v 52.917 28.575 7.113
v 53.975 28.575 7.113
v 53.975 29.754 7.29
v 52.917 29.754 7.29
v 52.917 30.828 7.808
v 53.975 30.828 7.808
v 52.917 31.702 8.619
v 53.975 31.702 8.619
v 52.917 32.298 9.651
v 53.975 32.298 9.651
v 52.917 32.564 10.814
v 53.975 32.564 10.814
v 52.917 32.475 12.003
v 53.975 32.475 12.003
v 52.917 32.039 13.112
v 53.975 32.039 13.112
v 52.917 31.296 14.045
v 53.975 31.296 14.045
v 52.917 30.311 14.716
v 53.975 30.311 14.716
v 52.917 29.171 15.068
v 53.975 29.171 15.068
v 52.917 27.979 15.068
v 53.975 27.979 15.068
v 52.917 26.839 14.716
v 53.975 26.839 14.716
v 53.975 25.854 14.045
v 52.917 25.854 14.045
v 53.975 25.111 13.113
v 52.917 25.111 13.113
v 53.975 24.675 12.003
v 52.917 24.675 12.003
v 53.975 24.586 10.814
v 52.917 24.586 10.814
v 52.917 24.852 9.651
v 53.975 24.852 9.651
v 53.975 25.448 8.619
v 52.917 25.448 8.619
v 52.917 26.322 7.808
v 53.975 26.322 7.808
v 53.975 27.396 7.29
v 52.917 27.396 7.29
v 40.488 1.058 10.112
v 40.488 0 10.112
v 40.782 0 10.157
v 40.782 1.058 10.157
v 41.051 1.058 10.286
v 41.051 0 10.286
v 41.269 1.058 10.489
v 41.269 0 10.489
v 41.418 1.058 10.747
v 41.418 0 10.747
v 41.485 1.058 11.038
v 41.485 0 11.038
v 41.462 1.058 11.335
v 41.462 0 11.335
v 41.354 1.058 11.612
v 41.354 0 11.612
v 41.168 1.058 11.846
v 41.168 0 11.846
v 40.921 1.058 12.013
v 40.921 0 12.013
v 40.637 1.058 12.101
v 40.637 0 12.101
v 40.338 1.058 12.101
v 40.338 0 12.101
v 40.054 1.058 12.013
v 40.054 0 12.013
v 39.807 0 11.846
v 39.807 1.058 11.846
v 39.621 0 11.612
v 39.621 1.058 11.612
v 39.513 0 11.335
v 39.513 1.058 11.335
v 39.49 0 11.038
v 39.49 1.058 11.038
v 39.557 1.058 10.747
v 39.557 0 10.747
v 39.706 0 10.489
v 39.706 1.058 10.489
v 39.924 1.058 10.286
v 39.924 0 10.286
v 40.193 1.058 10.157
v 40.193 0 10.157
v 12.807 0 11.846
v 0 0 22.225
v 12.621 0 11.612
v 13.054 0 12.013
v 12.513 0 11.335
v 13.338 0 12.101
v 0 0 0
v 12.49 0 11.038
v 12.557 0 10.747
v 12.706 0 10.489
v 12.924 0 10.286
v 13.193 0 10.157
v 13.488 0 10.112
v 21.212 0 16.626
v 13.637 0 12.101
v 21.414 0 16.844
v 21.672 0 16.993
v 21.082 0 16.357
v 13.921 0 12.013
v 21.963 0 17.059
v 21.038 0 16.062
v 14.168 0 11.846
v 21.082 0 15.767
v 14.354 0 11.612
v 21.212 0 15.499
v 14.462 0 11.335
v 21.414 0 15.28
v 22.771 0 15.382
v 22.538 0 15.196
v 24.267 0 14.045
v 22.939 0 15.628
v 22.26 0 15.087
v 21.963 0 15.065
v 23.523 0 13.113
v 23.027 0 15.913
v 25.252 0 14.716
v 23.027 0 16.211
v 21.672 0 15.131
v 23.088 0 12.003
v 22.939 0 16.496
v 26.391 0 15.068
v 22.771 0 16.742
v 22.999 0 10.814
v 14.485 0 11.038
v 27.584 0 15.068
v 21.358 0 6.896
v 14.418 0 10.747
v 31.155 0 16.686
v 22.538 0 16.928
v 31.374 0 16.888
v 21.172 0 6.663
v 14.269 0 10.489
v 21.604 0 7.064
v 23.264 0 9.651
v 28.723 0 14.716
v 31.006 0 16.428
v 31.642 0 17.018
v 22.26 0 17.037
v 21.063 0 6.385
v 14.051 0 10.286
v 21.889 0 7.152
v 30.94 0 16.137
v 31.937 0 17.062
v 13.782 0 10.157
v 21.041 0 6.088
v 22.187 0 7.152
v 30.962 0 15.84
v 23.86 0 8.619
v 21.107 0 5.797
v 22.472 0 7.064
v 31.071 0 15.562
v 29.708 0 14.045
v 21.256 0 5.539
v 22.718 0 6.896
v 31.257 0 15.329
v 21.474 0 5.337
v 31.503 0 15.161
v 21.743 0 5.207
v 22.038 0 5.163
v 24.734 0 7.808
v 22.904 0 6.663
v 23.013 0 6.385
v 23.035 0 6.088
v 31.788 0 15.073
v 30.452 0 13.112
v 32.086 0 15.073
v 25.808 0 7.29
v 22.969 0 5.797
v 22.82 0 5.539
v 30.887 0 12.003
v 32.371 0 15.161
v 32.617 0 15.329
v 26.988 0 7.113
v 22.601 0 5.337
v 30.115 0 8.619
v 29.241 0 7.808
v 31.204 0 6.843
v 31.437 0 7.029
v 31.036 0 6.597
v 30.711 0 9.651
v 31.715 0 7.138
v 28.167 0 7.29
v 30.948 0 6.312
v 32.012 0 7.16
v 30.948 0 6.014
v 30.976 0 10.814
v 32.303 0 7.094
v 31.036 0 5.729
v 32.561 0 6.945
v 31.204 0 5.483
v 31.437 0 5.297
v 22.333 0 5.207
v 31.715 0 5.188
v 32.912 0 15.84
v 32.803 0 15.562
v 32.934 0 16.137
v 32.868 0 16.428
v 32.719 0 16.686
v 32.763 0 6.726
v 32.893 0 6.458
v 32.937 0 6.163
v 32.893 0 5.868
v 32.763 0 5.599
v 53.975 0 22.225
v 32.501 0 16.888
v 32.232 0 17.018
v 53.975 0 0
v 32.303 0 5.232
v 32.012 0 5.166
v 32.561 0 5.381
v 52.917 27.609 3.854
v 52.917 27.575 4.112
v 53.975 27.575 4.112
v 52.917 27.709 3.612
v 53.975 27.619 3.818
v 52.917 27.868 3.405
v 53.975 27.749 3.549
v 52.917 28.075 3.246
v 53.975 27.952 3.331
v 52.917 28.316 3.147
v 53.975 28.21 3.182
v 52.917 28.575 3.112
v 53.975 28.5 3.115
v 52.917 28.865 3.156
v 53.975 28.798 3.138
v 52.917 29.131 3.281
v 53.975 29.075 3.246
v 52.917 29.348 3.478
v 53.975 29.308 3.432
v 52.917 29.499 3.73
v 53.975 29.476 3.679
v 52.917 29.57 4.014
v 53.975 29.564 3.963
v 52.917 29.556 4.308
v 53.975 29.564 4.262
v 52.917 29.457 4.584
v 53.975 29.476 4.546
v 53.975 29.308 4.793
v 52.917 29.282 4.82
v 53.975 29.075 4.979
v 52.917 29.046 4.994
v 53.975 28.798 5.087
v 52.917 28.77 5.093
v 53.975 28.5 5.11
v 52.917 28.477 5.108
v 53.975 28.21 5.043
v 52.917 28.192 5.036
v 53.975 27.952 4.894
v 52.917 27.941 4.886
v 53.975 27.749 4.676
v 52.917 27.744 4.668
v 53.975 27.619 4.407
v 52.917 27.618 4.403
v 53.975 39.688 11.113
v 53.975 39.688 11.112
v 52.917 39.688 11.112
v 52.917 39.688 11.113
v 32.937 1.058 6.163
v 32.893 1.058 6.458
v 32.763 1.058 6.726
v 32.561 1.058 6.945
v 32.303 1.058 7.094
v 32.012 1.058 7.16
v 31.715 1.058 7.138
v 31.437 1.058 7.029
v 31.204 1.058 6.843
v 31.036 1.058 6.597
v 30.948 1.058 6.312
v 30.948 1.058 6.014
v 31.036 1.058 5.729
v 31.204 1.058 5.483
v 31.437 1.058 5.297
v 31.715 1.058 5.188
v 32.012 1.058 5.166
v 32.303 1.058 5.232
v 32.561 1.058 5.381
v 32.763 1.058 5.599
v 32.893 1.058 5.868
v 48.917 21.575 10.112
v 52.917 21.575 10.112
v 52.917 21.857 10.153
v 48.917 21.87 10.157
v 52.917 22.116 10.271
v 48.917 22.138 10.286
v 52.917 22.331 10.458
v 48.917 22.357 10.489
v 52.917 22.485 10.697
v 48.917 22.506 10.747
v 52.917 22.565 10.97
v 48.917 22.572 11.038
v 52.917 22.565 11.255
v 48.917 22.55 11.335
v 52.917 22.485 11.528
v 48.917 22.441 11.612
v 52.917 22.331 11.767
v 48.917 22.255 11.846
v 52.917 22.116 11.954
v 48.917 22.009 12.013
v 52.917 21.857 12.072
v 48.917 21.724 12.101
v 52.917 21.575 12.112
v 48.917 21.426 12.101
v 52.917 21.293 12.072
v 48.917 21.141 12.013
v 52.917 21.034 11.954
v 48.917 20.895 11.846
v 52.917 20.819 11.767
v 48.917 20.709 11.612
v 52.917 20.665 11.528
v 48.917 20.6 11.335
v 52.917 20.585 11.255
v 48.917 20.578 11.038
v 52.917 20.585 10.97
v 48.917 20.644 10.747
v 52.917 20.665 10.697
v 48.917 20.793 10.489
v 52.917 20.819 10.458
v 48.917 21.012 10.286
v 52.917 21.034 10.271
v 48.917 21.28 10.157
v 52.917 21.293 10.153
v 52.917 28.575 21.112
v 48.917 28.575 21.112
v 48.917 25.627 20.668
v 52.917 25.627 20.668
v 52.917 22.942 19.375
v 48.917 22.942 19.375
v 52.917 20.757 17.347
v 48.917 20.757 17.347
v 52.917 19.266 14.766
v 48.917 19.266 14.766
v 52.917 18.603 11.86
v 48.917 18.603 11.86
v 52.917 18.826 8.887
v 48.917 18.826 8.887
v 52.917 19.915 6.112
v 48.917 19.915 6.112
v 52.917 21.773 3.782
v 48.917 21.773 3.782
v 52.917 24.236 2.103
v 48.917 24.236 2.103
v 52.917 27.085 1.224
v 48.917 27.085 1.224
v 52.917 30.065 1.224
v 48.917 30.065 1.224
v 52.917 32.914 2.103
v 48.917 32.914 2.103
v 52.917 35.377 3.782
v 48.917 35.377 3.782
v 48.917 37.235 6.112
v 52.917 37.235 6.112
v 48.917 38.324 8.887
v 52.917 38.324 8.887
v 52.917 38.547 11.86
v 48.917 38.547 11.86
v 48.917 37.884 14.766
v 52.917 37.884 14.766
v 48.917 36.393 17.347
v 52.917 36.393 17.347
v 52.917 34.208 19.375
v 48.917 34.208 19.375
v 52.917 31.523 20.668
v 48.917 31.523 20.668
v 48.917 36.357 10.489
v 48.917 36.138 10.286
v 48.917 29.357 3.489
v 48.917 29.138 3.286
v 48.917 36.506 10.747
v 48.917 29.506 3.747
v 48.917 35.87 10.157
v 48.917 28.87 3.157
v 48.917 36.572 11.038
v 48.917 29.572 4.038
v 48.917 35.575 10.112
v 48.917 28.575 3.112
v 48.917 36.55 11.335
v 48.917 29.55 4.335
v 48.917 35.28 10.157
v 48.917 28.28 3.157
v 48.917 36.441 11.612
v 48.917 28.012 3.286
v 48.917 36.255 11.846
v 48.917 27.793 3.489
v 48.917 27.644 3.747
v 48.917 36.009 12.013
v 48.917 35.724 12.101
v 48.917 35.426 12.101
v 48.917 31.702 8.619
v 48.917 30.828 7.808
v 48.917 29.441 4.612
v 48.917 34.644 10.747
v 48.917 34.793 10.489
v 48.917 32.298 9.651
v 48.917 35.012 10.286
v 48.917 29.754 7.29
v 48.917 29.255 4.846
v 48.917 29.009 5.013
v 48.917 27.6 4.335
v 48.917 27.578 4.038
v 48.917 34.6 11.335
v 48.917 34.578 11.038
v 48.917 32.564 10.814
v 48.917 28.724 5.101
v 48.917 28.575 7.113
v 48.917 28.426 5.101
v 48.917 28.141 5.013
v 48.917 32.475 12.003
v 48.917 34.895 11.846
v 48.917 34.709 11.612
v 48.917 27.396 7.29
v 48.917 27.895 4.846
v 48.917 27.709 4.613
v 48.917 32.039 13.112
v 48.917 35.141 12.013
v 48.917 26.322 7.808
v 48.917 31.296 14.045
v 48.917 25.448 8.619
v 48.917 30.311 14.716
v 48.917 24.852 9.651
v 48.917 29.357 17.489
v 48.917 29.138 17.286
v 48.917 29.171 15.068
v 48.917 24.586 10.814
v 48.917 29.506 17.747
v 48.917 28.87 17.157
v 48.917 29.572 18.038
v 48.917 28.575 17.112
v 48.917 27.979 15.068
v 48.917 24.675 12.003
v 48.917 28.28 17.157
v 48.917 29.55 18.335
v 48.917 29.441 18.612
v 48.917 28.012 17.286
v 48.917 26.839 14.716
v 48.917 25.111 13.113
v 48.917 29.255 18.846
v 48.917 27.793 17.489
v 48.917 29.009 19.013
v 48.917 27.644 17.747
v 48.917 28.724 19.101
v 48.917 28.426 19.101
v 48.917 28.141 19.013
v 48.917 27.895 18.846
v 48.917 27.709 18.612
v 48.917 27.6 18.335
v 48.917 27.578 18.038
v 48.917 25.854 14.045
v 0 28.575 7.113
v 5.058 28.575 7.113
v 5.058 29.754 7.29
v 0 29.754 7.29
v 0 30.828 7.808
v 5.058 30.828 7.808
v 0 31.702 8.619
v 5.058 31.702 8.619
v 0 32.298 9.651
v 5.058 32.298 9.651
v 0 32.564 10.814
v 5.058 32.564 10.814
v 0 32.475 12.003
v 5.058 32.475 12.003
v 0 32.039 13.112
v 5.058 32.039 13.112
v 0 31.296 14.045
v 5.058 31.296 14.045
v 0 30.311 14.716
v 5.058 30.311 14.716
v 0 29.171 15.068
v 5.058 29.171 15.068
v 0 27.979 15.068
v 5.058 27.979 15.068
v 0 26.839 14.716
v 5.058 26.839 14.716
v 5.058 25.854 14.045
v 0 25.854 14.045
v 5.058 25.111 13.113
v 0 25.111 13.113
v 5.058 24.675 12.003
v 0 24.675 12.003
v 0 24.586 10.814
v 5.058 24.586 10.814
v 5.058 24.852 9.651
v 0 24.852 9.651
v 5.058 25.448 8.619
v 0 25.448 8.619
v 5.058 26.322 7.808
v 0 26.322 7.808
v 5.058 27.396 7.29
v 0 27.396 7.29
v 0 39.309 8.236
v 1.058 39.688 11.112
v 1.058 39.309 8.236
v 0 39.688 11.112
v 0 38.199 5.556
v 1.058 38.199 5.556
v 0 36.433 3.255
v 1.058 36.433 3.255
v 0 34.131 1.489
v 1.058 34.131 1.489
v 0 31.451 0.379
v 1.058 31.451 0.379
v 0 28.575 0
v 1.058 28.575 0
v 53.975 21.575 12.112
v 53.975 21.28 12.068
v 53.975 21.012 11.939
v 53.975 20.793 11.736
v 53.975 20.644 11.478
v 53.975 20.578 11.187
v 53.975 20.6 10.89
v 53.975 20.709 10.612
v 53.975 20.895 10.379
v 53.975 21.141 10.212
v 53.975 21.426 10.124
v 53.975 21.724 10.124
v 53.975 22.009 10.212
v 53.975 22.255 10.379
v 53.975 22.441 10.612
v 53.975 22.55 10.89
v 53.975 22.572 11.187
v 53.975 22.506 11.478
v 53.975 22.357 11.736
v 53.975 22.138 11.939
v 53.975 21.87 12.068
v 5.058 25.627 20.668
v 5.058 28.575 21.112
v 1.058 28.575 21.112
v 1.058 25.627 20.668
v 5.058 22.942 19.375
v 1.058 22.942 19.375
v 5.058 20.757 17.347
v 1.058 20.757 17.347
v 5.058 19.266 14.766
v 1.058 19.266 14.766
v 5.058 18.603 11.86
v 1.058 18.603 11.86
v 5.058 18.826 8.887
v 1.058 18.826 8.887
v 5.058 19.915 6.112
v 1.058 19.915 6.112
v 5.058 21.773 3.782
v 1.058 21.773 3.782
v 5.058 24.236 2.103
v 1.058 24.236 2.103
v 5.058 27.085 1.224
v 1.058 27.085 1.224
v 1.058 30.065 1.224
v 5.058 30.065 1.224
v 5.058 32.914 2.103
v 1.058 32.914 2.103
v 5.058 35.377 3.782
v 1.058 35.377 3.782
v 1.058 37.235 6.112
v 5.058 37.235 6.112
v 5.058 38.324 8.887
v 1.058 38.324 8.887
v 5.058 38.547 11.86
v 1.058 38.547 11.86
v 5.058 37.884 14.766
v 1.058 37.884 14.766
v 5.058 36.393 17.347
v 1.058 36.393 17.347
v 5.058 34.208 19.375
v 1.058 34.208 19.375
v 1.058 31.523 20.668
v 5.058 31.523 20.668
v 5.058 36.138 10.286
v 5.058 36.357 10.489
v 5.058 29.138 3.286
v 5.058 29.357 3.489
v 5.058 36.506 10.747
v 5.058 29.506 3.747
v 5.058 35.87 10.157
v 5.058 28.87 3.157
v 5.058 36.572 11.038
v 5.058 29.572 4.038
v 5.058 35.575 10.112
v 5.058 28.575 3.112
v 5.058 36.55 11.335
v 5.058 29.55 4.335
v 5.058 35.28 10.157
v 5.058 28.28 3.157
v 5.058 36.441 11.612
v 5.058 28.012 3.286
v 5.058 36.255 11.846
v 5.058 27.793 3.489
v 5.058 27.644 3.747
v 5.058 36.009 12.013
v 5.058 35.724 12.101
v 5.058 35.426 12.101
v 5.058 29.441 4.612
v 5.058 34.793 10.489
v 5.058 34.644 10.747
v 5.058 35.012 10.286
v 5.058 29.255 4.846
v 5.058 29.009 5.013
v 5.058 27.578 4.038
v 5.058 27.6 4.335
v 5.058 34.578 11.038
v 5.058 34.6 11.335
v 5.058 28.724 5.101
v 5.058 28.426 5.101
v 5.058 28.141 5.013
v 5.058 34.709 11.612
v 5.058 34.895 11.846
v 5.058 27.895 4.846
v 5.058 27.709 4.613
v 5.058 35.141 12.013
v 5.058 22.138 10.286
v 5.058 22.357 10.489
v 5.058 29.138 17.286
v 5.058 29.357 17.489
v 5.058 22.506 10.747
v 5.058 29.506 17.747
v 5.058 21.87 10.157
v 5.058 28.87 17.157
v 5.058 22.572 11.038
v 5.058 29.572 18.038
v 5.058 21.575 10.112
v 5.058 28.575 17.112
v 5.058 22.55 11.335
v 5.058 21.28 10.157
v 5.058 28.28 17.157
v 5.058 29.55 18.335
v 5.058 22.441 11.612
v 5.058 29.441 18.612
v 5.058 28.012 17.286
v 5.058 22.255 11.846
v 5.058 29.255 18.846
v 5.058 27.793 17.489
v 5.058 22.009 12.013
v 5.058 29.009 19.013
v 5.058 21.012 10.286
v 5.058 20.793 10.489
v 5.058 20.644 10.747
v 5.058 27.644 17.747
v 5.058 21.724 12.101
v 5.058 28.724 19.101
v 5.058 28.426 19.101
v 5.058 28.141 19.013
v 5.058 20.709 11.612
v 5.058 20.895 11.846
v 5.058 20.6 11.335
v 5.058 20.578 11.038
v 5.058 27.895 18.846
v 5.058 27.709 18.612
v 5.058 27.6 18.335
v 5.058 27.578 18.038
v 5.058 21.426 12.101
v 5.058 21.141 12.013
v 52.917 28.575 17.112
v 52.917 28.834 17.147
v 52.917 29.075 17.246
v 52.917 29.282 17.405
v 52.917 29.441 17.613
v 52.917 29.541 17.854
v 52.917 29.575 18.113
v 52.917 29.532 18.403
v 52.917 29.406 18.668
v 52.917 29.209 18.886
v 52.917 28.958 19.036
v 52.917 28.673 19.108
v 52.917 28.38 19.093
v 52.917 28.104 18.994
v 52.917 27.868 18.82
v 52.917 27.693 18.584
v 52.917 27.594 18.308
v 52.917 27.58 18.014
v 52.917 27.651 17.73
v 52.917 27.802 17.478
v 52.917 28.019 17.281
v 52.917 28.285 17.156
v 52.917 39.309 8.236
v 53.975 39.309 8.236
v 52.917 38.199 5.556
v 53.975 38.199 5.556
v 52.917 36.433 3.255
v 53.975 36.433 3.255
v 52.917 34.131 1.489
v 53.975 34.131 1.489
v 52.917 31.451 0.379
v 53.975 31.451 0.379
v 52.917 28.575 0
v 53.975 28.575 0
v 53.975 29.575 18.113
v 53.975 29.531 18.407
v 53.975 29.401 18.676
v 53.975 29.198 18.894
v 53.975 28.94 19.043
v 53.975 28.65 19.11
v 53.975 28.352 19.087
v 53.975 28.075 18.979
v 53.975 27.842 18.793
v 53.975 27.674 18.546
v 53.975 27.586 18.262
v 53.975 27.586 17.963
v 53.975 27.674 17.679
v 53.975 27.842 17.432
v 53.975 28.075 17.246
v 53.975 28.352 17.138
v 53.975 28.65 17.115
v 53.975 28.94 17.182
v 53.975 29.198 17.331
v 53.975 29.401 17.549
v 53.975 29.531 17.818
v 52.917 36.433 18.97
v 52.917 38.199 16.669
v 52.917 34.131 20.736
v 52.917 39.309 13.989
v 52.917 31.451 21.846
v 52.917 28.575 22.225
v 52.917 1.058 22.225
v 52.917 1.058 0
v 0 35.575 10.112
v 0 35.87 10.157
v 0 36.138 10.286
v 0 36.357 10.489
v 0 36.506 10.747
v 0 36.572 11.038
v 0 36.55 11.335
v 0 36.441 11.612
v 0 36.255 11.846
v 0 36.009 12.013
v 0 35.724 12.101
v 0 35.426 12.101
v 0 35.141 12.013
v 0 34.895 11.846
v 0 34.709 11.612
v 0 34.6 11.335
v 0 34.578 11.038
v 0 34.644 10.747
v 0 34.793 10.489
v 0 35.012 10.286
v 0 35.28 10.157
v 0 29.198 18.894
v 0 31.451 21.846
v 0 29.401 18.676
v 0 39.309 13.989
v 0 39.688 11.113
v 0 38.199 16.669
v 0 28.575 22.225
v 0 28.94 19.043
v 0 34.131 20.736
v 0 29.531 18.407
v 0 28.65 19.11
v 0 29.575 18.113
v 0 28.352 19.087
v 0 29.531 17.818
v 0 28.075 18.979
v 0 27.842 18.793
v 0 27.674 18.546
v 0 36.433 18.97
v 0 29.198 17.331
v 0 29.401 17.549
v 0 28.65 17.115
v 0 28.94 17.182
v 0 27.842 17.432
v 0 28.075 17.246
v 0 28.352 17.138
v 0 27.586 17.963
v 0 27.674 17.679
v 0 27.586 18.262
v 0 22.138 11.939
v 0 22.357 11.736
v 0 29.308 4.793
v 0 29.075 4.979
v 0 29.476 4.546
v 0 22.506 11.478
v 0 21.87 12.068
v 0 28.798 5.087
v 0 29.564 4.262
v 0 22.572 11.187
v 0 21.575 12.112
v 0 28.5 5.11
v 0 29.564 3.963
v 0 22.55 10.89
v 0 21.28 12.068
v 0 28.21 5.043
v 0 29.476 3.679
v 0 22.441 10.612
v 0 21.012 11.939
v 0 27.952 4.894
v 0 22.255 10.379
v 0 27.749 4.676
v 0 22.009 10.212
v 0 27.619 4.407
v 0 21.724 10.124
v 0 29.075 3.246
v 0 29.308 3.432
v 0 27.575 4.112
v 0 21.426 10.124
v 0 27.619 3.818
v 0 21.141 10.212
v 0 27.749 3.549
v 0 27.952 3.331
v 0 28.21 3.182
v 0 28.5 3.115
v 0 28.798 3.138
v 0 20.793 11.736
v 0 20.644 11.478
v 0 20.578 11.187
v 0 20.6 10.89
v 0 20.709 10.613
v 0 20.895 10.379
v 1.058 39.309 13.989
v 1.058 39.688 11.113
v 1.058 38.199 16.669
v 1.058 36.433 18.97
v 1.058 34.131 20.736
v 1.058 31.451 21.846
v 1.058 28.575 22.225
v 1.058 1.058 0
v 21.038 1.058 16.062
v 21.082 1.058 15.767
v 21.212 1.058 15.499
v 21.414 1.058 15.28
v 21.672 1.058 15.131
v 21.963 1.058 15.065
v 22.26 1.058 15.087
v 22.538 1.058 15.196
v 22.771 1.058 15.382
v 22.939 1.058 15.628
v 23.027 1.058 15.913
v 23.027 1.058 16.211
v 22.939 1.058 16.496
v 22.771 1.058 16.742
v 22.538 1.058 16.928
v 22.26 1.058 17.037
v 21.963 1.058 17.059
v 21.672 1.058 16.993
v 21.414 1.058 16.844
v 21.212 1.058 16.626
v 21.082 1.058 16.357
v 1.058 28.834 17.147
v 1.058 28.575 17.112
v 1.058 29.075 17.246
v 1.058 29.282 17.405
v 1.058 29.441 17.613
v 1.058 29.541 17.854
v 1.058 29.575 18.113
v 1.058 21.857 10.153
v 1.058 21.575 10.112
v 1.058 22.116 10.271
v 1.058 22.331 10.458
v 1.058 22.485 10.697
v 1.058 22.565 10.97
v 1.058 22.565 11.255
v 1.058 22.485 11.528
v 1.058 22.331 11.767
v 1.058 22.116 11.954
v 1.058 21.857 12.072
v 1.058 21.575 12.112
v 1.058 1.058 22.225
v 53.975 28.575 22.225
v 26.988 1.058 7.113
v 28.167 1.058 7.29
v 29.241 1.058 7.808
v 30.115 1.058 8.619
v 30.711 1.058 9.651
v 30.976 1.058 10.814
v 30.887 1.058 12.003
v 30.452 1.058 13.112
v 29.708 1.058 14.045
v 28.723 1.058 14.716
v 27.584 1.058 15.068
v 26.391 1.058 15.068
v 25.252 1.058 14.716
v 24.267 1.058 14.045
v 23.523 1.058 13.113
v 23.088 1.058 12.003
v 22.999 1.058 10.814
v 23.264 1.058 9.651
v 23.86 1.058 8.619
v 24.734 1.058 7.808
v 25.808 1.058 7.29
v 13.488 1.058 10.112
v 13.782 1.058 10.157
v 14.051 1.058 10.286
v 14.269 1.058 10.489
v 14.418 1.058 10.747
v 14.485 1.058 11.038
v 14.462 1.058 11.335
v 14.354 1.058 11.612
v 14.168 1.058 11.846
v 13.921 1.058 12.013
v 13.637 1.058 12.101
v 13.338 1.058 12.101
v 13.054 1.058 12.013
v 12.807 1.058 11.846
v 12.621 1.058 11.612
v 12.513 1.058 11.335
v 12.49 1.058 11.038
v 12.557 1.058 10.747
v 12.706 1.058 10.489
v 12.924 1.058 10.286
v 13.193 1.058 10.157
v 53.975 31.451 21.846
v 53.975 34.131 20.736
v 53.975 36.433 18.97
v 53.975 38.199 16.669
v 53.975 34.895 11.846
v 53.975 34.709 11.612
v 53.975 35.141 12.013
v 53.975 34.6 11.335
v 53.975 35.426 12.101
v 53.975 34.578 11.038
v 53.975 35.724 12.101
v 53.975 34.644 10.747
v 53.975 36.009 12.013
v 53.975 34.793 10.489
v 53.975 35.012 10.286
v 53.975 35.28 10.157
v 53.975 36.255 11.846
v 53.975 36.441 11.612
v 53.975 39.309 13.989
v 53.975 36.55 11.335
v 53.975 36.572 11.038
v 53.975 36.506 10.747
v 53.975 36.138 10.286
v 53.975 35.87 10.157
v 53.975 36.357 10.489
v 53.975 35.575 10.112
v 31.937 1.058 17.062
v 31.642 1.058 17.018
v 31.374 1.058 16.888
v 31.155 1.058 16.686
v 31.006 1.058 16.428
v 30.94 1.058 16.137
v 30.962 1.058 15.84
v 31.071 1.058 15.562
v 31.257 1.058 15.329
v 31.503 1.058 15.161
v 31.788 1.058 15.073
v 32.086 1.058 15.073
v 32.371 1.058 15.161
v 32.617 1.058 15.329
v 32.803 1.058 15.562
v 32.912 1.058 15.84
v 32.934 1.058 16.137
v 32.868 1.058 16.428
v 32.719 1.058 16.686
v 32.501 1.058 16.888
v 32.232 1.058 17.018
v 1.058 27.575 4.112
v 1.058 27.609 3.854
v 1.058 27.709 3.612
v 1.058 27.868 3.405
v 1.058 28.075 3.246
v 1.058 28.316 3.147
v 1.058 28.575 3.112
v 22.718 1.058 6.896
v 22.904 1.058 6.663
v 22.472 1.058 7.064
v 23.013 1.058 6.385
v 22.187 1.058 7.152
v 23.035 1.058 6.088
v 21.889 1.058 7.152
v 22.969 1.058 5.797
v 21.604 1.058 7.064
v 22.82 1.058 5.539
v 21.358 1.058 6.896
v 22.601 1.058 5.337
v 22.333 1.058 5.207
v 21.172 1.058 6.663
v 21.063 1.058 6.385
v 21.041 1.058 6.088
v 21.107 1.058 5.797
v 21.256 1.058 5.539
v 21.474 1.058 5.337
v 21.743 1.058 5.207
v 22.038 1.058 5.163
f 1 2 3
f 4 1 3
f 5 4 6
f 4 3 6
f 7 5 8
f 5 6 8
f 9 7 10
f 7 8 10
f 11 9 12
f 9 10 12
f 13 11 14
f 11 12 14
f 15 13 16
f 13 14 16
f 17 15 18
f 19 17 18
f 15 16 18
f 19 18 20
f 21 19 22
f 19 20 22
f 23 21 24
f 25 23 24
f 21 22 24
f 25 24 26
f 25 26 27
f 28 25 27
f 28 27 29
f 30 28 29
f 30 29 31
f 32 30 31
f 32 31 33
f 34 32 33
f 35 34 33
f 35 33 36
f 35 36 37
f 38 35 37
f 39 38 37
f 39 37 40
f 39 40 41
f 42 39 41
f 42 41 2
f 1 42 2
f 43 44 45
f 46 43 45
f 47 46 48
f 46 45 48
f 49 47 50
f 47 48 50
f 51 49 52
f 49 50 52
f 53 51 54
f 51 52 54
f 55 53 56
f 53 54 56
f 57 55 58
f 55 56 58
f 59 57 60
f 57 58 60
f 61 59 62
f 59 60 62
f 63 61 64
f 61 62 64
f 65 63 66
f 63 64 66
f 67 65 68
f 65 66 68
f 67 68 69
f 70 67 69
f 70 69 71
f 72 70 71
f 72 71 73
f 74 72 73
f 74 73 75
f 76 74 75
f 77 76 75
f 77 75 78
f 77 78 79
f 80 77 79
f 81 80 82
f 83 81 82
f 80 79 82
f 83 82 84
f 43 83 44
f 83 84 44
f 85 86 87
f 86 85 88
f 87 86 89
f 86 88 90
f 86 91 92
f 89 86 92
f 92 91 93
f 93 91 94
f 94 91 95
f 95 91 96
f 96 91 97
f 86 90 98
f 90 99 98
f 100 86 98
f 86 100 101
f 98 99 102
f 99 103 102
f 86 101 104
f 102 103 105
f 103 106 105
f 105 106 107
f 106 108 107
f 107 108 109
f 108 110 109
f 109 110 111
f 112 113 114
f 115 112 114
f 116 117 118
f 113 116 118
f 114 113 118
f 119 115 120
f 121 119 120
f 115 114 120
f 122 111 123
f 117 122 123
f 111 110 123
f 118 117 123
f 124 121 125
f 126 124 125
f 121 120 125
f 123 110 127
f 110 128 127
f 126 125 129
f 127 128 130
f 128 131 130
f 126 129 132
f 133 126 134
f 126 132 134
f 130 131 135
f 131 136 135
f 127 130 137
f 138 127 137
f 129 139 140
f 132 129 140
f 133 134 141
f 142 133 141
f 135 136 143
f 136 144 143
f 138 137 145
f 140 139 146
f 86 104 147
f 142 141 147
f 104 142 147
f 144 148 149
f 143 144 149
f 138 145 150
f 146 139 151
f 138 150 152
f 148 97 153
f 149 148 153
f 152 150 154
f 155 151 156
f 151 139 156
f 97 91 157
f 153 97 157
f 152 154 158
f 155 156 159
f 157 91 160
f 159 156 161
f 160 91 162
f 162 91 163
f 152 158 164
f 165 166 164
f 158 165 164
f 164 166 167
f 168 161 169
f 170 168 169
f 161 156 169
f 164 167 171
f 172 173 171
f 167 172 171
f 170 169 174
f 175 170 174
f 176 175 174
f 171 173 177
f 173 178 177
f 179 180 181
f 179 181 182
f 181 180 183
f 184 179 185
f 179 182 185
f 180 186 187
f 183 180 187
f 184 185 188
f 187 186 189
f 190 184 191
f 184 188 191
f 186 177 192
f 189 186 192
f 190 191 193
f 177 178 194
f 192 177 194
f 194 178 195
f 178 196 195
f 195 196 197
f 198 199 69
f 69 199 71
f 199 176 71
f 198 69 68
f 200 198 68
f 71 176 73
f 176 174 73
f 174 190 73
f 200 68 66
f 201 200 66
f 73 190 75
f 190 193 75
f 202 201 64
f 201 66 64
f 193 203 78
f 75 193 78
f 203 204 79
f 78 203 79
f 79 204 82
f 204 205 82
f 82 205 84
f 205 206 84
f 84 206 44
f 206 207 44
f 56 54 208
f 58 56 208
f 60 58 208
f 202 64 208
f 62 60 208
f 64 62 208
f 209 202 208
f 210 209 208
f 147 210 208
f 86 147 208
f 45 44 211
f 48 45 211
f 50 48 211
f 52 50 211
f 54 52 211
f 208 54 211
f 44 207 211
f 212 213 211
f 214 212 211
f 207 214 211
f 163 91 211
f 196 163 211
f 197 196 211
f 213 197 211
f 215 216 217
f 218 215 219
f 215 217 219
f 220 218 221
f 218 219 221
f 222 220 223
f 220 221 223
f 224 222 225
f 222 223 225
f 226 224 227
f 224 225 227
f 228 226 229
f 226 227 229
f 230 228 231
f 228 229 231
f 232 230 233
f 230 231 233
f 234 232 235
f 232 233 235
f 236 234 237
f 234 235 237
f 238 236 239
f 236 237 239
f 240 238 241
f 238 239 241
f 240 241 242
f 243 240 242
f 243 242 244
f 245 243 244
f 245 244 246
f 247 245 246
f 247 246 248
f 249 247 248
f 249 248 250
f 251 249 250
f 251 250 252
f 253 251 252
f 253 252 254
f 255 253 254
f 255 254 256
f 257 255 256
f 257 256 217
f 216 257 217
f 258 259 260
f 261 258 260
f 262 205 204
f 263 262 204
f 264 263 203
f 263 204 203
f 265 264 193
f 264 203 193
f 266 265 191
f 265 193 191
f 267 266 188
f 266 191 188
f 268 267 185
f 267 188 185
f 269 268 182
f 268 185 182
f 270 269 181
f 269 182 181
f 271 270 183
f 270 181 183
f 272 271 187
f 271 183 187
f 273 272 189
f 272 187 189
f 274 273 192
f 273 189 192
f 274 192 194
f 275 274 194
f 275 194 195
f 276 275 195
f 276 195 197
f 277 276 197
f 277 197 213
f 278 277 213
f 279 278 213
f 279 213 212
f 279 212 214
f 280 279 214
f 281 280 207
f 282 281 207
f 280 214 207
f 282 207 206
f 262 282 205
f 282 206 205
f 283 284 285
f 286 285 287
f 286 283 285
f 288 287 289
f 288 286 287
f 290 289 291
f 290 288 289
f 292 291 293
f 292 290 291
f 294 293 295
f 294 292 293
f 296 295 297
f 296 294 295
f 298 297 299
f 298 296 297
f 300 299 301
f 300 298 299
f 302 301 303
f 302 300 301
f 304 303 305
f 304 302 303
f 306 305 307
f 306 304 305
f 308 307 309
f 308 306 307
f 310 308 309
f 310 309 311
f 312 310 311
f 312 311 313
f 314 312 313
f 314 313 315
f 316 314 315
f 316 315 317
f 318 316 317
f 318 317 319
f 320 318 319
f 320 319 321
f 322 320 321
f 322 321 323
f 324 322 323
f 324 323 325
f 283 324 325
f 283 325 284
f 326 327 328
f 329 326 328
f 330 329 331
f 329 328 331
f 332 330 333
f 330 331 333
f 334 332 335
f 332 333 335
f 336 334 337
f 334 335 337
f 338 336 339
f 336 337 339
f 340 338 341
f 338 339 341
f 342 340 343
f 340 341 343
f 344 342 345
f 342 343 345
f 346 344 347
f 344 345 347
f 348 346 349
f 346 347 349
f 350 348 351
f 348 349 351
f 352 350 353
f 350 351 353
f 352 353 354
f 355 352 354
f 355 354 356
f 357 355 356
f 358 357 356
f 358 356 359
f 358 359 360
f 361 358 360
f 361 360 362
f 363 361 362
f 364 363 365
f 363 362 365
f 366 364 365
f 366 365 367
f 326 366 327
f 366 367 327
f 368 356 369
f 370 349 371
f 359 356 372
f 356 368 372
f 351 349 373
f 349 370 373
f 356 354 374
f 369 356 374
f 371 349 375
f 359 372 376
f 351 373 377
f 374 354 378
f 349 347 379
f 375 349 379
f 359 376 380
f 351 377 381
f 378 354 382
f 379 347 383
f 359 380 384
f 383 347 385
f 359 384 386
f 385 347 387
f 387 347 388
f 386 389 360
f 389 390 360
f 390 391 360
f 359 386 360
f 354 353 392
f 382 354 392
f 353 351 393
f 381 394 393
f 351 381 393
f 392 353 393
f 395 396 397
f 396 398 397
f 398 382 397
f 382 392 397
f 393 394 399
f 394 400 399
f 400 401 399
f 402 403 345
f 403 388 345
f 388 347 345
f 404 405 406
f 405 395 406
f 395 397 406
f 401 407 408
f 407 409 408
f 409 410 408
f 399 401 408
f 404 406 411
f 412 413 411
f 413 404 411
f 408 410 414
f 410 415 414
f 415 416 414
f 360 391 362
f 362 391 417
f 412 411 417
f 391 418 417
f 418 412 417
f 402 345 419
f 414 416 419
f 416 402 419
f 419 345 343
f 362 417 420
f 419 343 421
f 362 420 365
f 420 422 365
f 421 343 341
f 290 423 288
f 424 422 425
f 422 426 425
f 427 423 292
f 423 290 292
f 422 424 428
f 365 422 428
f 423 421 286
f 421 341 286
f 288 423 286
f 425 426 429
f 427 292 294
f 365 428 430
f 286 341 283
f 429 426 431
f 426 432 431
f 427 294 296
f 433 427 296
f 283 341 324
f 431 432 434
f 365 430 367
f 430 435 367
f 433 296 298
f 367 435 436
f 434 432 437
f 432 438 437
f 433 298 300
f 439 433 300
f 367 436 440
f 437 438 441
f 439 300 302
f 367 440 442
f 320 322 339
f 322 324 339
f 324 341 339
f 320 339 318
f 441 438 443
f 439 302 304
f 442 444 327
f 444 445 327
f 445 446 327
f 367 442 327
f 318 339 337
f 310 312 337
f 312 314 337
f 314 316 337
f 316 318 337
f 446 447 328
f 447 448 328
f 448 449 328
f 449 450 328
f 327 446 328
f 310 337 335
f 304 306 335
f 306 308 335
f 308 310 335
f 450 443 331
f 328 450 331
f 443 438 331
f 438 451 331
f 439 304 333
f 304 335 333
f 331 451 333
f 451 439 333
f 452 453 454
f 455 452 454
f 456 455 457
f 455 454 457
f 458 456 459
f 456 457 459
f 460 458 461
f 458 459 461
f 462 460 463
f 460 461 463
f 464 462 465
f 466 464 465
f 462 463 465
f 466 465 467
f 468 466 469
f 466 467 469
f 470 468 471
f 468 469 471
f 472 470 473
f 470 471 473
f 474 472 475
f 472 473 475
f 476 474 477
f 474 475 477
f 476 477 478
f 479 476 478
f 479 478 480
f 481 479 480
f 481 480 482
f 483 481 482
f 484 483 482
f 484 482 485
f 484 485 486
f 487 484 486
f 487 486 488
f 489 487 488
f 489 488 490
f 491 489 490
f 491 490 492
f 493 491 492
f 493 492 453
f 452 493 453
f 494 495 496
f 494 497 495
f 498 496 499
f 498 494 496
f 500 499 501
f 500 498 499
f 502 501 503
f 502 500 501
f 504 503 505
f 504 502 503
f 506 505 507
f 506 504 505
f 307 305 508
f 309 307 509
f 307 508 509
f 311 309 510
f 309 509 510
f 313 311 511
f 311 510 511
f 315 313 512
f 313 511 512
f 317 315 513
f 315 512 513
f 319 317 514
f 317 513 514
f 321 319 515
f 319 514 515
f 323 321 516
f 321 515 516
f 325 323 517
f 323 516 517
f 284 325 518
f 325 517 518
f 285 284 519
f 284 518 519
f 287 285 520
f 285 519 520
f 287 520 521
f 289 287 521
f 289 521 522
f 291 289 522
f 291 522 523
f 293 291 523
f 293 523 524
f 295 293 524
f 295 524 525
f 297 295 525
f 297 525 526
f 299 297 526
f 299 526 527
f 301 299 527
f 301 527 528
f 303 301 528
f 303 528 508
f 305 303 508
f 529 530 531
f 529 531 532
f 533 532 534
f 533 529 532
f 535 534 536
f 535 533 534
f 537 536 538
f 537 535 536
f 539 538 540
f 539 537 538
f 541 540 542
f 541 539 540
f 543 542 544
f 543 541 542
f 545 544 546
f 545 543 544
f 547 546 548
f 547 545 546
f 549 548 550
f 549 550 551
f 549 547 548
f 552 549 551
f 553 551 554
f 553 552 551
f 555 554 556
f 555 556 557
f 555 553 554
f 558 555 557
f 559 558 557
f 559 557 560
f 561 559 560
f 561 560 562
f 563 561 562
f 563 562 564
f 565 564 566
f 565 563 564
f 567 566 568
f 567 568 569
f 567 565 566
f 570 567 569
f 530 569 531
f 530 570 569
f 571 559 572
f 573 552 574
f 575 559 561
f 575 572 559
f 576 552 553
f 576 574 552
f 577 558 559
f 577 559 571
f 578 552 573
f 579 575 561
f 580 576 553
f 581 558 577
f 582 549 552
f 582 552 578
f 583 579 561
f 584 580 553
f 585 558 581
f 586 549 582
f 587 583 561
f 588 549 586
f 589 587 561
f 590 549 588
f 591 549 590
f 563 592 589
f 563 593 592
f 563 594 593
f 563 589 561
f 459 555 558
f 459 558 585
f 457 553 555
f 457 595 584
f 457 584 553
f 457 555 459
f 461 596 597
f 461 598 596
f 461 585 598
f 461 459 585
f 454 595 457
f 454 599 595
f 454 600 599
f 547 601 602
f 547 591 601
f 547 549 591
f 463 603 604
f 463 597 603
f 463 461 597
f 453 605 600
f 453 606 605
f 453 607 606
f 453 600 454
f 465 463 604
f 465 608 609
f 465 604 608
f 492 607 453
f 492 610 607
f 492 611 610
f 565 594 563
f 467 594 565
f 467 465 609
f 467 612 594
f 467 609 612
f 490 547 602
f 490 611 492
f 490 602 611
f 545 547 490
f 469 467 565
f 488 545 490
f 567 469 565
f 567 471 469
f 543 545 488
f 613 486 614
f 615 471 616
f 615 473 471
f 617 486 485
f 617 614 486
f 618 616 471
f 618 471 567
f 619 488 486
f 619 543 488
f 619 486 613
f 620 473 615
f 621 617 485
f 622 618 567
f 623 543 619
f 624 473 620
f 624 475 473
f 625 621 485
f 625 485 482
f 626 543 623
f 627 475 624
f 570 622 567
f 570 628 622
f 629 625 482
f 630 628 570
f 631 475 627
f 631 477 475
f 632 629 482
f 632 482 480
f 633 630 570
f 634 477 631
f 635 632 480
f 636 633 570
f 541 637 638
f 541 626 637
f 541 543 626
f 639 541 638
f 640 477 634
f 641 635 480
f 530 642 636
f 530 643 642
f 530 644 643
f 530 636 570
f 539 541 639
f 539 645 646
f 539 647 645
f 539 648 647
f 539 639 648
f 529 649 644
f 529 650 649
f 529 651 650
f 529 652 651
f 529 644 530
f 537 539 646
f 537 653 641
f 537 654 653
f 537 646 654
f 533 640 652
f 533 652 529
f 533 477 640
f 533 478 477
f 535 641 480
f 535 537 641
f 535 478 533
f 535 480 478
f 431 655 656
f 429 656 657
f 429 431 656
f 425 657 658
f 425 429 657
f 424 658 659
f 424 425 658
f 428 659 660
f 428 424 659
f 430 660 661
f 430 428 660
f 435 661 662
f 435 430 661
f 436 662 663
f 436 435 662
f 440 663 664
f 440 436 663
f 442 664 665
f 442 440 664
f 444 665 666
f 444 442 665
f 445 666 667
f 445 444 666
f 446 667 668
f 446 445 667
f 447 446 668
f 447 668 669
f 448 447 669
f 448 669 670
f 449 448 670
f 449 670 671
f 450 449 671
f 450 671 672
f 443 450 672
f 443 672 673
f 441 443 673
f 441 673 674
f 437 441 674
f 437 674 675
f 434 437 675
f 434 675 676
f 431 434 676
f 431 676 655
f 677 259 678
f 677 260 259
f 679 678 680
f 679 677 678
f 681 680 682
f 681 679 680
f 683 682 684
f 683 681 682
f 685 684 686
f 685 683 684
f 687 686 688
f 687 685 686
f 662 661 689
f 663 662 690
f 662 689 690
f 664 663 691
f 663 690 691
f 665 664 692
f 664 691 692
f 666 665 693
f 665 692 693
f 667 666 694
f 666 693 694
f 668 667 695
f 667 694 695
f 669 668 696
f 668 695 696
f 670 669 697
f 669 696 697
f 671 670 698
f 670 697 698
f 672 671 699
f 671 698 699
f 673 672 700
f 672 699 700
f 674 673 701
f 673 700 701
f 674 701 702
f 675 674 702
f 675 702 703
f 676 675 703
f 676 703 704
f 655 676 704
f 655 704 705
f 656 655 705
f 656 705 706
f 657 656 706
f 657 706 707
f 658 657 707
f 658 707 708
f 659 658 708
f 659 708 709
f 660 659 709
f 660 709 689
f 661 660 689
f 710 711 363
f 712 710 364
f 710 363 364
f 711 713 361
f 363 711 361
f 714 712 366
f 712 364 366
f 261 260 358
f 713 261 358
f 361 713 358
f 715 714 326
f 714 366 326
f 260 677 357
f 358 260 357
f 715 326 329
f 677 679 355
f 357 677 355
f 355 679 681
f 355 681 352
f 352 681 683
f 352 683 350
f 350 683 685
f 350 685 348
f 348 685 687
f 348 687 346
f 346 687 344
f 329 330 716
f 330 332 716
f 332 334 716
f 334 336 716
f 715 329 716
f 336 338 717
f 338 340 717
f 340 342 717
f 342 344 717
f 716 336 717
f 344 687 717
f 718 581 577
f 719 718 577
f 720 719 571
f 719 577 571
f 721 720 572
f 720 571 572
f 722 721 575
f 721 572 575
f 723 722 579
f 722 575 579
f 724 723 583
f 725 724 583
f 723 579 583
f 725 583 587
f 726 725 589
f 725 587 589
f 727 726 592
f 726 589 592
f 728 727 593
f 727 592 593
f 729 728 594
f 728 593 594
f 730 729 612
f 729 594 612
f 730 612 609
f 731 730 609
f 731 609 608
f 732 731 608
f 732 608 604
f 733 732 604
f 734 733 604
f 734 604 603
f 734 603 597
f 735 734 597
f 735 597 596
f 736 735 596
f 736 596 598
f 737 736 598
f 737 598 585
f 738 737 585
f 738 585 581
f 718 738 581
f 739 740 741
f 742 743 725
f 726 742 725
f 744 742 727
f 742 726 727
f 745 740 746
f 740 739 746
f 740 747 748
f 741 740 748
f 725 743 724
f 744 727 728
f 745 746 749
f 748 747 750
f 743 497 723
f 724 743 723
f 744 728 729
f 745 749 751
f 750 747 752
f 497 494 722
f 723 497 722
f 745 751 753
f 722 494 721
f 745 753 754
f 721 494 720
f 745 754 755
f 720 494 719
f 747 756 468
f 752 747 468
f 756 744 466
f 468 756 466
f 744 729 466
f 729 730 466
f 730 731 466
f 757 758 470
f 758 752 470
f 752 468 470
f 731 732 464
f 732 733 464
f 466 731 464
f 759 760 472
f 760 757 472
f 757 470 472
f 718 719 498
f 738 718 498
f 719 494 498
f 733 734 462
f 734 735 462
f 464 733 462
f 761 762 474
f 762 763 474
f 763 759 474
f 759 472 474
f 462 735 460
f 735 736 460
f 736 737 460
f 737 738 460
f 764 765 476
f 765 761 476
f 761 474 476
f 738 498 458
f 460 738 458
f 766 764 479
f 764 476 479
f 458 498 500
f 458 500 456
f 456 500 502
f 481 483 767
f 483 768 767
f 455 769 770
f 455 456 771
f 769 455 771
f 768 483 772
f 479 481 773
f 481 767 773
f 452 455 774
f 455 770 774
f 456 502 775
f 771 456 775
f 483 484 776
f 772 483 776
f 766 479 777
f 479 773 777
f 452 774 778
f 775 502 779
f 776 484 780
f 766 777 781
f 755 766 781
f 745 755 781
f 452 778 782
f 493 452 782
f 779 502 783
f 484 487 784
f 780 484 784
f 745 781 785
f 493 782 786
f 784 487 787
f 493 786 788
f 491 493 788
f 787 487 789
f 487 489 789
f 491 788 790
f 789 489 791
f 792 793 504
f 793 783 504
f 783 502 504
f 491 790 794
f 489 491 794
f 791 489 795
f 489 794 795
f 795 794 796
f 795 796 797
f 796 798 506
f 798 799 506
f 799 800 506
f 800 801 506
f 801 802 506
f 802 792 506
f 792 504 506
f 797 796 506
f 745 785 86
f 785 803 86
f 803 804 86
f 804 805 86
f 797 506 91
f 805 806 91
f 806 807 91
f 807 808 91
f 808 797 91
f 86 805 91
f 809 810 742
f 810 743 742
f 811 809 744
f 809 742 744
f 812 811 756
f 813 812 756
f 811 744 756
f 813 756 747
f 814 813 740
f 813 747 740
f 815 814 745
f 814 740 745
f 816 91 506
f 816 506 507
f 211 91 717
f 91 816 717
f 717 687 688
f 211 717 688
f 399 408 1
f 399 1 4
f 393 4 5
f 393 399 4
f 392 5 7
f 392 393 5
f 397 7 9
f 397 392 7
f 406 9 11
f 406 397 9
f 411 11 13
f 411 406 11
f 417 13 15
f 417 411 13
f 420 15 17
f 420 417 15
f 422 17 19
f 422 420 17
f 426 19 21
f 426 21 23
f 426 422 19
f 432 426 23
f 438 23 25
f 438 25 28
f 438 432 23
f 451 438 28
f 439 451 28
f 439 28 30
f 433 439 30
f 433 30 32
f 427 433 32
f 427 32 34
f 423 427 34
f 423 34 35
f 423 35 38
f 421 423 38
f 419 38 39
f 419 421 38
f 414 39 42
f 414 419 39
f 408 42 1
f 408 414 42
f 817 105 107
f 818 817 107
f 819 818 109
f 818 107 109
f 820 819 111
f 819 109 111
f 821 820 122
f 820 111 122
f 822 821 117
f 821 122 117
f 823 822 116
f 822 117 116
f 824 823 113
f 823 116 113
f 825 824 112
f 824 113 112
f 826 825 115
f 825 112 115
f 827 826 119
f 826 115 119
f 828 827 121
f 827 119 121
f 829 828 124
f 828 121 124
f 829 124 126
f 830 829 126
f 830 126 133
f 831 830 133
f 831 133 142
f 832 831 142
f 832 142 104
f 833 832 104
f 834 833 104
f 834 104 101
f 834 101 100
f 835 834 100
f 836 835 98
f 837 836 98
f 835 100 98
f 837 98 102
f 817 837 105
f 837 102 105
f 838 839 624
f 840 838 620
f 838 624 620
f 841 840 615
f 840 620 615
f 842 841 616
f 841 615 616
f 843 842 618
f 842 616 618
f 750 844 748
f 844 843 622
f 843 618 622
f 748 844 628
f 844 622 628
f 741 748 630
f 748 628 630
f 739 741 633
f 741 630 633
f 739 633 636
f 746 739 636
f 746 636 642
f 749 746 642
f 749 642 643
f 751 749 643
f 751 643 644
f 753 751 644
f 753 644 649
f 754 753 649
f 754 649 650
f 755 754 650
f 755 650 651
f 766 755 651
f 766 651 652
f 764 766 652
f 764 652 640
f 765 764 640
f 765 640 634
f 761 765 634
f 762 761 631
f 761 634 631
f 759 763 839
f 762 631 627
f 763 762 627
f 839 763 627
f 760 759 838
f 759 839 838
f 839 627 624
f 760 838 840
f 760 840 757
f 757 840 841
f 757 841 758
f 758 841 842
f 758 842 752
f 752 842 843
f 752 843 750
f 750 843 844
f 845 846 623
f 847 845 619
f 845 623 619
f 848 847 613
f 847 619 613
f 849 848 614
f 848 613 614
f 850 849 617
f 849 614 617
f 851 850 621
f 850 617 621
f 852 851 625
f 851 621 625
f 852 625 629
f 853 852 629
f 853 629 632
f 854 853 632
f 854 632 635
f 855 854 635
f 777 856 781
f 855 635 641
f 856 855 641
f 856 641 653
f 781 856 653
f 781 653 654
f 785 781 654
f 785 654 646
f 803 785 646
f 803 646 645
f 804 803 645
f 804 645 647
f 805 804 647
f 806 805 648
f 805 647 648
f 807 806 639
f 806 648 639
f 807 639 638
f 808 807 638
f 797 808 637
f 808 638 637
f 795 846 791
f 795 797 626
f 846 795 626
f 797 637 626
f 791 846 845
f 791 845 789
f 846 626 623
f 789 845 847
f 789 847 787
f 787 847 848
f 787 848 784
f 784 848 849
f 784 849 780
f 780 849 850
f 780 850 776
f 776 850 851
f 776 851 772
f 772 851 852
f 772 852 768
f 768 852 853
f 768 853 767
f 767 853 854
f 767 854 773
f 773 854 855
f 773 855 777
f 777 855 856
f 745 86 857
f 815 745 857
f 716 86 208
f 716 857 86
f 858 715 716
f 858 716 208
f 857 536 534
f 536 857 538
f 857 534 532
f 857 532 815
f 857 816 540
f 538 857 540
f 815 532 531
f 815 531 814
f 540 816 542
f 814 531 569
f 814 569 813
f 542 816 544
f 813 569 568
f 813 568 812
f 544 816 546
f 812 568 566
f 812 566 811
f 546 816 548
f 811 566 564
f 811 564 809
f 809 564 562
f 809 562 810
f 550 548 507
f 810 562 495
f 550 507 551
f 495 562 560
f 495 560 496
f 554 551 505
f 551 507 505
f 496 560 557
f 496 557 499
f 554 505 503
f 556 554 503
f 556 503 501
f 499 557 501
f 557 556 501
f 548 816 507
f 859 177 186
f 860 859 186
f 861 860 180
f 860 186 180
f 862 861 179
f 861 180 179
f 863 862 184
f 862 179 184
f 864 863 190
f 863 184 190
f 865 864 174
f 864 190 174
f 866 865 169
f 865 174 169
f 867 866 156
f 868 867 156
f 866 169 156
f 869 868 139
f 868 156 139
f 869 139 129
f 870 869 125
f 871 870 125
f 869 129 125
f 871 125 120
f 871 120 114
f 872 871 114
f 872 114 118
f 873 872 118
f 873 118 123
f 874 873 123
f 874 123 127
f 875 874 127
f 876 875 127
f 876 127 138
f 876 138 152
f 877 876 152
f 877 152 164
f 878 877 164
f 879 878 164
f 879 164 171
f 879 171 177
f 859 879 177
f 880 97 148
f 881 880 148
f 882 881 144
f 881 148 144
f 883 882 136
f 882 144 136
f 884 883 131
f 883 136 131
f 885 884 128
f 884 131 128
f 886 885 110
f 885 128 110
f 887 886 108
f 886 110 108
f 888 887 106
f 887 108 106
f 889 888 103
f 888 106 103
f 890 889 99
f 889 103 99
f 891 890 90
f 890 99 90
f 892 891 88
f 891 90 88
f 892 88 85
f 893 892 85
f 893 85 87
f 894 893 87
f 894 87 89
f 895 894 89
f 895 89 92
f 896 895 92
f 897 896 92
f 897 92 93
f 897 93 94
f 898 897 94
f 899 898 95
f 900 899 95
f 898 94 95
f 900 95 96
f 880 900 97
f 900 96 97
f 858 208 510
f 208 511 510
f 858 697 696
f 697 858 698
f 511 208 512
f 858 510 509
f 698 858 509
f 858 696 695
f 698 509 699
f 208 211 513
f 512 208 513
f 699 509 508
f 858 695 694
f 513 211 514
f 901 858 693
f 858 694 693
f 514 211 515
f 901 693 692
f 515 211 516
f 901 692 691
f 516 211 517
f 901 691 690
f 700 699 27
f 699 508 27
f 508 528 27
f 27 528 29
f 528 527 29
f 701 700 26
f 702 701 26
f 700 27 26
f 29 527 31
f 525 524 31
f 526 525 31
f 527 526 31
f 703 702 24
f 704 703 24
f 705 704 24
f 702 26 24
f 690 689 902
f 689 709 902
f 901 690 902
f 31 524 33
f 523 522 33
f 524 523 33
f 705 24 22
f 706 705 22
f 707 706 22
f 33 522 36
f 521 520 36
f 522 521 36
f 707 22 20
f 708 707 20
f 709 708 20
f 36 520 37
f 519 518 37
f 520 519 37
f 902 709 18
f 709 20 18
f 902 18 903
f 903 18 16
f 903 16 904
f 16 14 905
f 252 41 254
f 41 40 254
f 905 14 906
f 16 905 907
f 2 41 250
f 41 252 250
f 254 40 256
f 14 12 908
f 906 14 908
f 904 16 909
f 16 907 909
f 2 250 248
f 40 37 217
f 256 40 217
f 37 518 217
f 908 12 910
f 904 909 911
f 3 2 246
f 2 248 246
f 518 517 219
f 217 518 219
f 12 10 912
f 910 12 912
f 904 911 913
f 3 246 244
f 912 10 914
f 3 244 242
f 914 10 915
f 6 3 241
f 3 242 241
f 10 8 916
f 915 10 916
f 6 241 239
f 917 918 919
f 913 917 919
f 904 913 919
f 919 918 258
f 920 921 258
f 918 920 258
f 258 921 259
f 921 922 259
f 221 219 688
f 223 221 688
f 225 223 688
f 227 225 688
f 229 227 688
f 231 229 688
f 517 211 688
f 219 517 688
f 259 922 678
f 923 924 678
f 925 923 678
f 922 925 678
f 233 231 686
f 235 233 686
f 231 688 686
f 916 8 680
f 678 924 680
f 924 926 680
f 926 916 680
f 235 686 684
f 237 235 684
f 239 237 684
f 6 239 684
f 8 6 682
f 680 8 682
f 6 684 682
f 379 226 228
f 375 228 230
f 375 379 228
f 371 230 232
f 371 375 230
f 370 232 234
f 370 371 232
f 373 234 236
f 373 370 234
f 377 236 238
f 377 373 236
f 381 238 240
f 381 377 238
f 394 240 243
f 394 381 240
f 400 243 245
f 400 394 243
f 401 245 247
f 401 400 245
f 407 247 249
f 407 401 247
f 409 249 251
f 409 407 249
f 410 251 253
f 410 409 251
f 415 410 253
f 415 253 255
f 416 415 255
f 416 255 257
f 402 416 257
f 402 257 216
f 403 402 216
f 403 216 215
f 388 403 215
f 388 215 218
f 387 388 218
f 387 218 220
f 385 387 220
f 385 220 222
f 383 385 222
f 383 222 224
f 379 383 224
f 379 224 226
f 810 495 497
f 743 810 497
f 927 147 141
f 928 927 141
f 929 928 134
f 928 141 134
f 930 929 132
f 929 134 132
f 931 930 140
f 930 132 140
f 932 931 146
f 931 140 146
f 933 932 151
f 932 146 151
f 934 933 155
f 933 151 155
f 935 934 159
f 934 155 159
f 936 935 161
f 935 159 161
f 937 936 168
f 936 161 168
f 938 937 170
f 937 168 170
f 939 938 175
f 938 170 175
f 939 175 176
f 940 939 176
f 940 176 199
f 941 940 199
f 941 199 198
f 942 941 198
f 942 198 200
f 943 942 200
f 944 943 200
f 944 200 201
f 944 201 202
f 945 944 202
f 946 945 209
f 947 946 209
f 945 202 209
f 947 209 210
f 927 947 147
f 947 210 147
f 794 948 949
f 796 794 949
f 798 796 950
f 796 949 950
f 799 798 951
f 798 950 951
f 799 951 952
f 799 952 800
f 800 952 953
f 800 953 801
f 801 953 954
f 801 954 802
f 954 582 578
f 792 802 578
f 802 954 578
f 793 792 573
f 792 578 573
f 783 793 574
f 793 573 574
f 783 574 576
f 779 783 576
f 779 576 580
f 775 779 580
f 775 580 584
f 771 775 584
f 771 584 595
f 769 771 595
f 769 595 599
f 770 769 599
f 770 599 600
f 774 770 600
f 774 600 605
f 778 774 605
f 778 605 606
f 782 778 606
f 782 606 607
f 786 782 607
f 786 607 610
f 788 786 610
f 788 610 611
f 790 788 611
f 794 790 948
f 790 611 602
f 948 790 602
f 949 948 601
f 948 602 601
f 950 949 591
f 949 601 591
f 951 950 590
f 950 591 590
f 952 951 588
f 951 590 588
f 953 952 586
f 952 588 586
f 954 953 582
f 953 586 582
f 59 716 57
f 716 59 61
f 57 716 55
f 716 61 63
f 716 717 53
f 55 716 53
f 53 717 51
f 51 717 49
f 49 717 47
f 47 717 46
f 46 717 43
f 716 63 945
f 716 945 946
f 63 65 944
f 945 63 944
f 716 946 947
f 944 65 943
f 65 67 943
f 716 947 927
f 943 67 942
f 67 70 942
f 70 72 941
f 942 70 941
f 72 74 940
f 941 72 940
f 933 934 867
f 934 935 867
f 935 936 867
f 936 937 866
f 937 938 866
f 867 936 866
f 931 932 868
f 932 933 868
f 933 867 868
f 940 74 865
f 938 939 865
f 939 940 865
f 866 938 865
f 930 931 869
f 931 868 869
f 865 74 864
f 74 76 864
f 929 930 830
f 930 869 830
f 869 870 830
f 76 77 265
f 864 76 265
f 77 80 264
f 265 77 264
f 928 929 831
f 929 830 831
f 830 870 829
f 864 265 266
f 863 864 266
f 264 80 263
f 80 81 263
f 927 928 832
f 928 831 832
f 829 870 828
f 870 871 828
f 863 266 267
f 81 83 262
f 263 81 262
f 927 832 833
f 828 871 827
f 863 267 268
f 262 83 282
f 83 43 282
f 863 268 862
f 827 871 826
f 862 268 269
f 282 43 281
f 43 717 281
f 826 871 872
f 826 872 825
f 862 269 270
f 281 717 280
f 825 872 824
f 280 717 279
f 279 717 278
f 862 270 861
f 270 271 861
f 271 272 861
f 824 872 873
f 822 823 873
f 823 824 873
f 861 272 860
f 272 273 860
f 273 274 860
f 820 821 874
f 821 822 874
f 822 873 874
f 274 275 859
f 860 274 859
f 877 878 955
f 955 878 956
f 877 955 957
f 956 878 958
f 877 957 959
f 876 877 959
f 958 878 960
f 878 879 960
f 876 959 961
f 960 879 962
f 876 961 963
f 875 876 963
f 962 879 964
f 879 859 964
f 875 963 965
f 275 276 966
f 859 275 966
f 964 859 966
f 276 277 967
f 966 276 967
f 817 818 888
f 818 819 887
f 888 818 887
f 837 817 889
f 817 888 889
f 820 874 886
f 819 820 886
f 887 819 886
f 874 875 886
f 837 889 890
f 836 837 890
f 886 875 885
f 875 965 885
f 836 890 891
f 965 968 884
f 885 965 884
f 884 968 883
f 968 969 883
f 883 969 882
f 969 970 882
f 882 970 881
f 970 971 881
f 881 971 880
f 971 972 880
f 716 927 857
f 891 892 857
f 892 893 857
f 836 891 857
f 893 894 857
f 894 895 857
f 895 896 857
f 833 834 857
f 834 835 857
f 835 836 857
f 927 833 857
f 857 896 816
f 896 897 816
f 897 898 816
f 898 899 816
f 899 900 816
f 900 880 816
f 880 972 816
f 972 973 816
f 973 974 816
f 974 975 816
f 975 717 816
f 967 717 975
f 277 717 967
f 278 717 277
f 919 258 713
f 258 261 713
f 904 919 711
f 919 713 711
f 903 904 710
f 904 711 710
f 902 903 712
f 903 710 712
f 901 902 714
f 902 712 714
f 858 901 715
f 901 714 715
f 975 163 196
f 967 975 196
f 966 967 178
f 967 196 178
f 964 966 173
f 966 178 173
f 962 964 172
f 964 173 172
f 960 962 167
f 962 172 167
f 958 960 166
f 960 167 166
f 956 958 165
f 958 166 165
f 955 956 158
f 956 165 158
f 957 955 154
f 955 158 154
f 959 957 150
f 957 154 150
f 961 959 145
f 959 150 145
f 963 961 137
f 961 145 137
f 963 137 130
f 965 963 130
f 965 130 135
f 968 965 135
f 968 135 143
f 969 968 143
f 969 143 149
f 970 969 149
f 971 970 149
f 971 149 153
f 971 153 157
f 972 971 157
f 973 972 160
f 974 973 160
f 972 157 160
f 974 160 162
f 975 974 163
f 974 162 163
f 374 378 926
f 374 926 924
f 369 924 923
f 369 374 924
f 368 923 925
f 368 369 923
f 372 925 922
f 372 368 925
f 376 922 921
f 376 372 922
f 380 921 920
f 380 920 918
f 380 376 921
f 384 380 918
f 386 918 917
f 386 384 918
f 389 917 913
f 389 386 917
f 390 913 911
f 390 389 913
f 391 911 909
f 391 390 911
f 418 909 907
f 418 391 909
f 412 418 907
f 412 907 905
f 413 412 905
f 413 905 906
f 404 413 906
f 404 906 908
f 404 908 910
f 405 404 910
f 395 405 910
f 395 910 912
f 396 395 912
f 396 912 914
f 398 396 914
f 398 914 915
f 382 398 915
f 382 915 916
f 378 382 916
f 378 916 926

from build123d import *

# Parameters (mm, degrees)
BOSS_EXTRUDE1_DEPTH = 22.225
FILLET1_R           = 11.1125
CUT_EXTRUDE1_REACH  = 72.586
SKETCH4_R           = 4
SKETCH4_R_2         = 1
CIRPATTERN1_COUNT   = 4
SKETCH5_R           = 4
SKETCH5_R_2         = 1
CUT_EXTRUDE2_DEPTH  = 1.058333333
CIRPATTERN2_COUNT   = 4
SKETCH6_R           = 1
CUT_EXTRUDE3_DEPTH  = 1.058333333
BOSS_EXTRUDE2_START = 4
SKETCH7_R           = 10
SKETCH7_R_2         = 1
SKETCH7_R_3         = 4
BOSS_EXTRUDE2_DEPTH = 4


with BuildPart() as part:
    # Sketch2 → Boss-Extrude1 (new body)
    with BuildSketch(Plane.XY):
        Polygon((0, 39.6875), (0, 0), (53.975, 0), (53.975, 39.6875), (52.916666667, 39.6875), (52.916666667, 1.058333333), (1.058333333, 1.058333333), (1.058333333, 39.6875), align=None)
    extrude(amount=BOSS_EXTRUDE1_DEPTH)

    # Fillet1
    fillet1_edges = [part.edges().sort_by_distance(p)[0] for p in [
        (0.529166667, 39.6875, 0),
        (0.529166667, 39.6875, 22.225),
        (53.445833333, 39.6875, 0),
        (53.445833333, 39.6875, 22.225),
    ]]
    fillet(fillet1_edges, radius=FILLET1_R - 0.0001)  # a hair under: the kernel refuses the full size

    # Cut-Extrude1: up to this face of the body (flat: up to its plane)
    cut_extrude1_end = Plane(part.part.faces().sort_by_distance((0, 18.733844913, 11.1125))[0])
    # Sketch4 → Cut-Extrude1 (cut, up to the picked face)
    with BuildSketch(Plane(origin=(53.975, 0, 0), x_dir=(0, 0, -1), z_dir=(1, 0, 0)), mode=Mode.PRIVATE) as cut_extrude1_sk1:
        with Locations((-11.1125, 28.575)):
            Circle(SKETCH4_R)
    cut_extrude1_tool1 = split(extrude(cut_extrude1_sk1.sketch, amount=-CUT_EXTRUDE1_REACH, mode=Mode.PRIVATE), bisect_by=cut_extrude1_end, keep=Keep.BOTH, mode=Mode.PRIVATE)
    # Sketch4 → Cut-Extrude1 (cut, up to the picked face)
    with BuildSketch(Plane(origin=(53.975, 0, 0), x_dir=(0, 0, -1), z_dir=(1, 0, 0)), mode=Mode.PRIVATE) as cut_extrude1_sk2:
        with Locations((-11.1125, 35.575)):
            Circle(SKETCH4_R_2)
    cut_extrude1_tool2 = split(extrude(cut_extrude1_sk2.sketch, amount=-CUT_EXTRUDE1_REACH, mode=Mode.PRIVATE), bisect_by=cut_extrude1_end, keep=Keep.BOTH, mode=Mode.PRIVATE)
    cut_extrude1_1 = cut_extrude1_tool1.solids().sort_by(Axis((53.975, 28.575, 11.1125), (-1, 0, 0)))[0]
    add(cut_extrude1_1, mode=Mode.SUBTRACT)
    cut_extrude1_2 = cut_extrude1_tool2.solids().sort_by(Axis((53.975, 35.575, 11.1125), (-1, 0, 0)))[0]
    add(cut_extrude1_2, mode=Mode.SUBTRACT)
    cut_extrude1 = cut_extrude1_1 + cut_extrude1_2  # Cut-Extrude1 as one shape, for the pattern or mirror that repeats it

    # CirPattern1: Cut-Extrude1 ×4 about axis
    cirpattern1_axis = Axis((0, 28.575, 11.1125), (1, 0, 0))
    for i in range(1, CIRPATTERN1_COUNT):
        add(cut_extrude1.rotate(cirpattern1_axis, i * 360 / CIRPATTERN1_COUNT), mode=Mode.SUBTRACT)

    # Sketch5 → Cut-Extrude2 (cut)
    with BuildSketch(Plane.XZ):
        with Locations(Location((26.9875, 11.1125, 0), (0, 0, 270))):
            Circle(SKETCH5_R)
        with Locations(Location((22.037752532, 6.162752532, 0), (0, 0, 270))):
            Circle(SKETCH5_R_2)
    cut_extrude2 = extrude(amount=-CUT_EXTRUDE2_DEPTH, mode=Mode.SUBTRACT)

    # CirPattern2: Cut-Extrude2 ×4 about axis
    cirpattern2_axis = Axis((26.9875, 0, 11.1125), (0, 1, 0))
    for i in range(1, CIRPATTERN2_COUNT):
        add(cut_extrude2.rotate(cirpattern2_axis, i * 360 / CIRPATTERN2_COUNT), mode=Mode.SUBTRACT)

    # Sketch6 → Cut-Extrude3 (cut)
    with BuildSketch(Plane.XZ):
        with Locations(Location((13.4875, 11.1125, 0), (0, 0, 270))):
            Circle(SKETCH6_R)
        with Locations(Location((40.4875, 11.1125, 0), (0, 0, 270))):
            Circle(SKETCH6_R)
    extrude(amount=-CUT_EXTRUDE3_DEPTH, mode=Mode.SUBTRACT)

    # Sketch7 → Boss-Extrude2 (add)
    with BuildSketch(Plane(origin=(1.058333333, 0, 0), x_dir=(0, 0, -1), z_dir=(1, 0, 0)).offset(BOSS_EXTRUDE2_START)):
        with Locations(Location((-11.1125, 28.575, 0), (0, 0, 180))):
            Circle(SKETCH7_R)
        with Locations((-18.1125, 28.575)):
            Circle(SKETCH7_R_2, mode=Mode.SUBTRACT)
        with Locations((-11.1125, 21.575)):
            Circle(SKETCH7_R_2, mode=Mode.SUBTRACT)
        with Locations((-4.1125, 28.575)):
            Circle(SKETCH7_R_2, mode=Mode.SUBTRACT)
        with Locations((-11.1125, 35.575)):
            Circle(SKETCH7_R_2, mode=Mode.SUBTRACT)
        with Locations((-11.1125, 28.575)):
            Circle(SKETCH7_R_3, mode=Mode.SUBTRACT)
    boss_extrude2 = extrude(amount=-BOSS_EXTRUDE2_DEPTH)

    # Mirror1: Boss-Extrude2 across plane
    add(boss_extrude2.mirror(Plane.ZY.offset(-26.9875)))


solid = part.part
